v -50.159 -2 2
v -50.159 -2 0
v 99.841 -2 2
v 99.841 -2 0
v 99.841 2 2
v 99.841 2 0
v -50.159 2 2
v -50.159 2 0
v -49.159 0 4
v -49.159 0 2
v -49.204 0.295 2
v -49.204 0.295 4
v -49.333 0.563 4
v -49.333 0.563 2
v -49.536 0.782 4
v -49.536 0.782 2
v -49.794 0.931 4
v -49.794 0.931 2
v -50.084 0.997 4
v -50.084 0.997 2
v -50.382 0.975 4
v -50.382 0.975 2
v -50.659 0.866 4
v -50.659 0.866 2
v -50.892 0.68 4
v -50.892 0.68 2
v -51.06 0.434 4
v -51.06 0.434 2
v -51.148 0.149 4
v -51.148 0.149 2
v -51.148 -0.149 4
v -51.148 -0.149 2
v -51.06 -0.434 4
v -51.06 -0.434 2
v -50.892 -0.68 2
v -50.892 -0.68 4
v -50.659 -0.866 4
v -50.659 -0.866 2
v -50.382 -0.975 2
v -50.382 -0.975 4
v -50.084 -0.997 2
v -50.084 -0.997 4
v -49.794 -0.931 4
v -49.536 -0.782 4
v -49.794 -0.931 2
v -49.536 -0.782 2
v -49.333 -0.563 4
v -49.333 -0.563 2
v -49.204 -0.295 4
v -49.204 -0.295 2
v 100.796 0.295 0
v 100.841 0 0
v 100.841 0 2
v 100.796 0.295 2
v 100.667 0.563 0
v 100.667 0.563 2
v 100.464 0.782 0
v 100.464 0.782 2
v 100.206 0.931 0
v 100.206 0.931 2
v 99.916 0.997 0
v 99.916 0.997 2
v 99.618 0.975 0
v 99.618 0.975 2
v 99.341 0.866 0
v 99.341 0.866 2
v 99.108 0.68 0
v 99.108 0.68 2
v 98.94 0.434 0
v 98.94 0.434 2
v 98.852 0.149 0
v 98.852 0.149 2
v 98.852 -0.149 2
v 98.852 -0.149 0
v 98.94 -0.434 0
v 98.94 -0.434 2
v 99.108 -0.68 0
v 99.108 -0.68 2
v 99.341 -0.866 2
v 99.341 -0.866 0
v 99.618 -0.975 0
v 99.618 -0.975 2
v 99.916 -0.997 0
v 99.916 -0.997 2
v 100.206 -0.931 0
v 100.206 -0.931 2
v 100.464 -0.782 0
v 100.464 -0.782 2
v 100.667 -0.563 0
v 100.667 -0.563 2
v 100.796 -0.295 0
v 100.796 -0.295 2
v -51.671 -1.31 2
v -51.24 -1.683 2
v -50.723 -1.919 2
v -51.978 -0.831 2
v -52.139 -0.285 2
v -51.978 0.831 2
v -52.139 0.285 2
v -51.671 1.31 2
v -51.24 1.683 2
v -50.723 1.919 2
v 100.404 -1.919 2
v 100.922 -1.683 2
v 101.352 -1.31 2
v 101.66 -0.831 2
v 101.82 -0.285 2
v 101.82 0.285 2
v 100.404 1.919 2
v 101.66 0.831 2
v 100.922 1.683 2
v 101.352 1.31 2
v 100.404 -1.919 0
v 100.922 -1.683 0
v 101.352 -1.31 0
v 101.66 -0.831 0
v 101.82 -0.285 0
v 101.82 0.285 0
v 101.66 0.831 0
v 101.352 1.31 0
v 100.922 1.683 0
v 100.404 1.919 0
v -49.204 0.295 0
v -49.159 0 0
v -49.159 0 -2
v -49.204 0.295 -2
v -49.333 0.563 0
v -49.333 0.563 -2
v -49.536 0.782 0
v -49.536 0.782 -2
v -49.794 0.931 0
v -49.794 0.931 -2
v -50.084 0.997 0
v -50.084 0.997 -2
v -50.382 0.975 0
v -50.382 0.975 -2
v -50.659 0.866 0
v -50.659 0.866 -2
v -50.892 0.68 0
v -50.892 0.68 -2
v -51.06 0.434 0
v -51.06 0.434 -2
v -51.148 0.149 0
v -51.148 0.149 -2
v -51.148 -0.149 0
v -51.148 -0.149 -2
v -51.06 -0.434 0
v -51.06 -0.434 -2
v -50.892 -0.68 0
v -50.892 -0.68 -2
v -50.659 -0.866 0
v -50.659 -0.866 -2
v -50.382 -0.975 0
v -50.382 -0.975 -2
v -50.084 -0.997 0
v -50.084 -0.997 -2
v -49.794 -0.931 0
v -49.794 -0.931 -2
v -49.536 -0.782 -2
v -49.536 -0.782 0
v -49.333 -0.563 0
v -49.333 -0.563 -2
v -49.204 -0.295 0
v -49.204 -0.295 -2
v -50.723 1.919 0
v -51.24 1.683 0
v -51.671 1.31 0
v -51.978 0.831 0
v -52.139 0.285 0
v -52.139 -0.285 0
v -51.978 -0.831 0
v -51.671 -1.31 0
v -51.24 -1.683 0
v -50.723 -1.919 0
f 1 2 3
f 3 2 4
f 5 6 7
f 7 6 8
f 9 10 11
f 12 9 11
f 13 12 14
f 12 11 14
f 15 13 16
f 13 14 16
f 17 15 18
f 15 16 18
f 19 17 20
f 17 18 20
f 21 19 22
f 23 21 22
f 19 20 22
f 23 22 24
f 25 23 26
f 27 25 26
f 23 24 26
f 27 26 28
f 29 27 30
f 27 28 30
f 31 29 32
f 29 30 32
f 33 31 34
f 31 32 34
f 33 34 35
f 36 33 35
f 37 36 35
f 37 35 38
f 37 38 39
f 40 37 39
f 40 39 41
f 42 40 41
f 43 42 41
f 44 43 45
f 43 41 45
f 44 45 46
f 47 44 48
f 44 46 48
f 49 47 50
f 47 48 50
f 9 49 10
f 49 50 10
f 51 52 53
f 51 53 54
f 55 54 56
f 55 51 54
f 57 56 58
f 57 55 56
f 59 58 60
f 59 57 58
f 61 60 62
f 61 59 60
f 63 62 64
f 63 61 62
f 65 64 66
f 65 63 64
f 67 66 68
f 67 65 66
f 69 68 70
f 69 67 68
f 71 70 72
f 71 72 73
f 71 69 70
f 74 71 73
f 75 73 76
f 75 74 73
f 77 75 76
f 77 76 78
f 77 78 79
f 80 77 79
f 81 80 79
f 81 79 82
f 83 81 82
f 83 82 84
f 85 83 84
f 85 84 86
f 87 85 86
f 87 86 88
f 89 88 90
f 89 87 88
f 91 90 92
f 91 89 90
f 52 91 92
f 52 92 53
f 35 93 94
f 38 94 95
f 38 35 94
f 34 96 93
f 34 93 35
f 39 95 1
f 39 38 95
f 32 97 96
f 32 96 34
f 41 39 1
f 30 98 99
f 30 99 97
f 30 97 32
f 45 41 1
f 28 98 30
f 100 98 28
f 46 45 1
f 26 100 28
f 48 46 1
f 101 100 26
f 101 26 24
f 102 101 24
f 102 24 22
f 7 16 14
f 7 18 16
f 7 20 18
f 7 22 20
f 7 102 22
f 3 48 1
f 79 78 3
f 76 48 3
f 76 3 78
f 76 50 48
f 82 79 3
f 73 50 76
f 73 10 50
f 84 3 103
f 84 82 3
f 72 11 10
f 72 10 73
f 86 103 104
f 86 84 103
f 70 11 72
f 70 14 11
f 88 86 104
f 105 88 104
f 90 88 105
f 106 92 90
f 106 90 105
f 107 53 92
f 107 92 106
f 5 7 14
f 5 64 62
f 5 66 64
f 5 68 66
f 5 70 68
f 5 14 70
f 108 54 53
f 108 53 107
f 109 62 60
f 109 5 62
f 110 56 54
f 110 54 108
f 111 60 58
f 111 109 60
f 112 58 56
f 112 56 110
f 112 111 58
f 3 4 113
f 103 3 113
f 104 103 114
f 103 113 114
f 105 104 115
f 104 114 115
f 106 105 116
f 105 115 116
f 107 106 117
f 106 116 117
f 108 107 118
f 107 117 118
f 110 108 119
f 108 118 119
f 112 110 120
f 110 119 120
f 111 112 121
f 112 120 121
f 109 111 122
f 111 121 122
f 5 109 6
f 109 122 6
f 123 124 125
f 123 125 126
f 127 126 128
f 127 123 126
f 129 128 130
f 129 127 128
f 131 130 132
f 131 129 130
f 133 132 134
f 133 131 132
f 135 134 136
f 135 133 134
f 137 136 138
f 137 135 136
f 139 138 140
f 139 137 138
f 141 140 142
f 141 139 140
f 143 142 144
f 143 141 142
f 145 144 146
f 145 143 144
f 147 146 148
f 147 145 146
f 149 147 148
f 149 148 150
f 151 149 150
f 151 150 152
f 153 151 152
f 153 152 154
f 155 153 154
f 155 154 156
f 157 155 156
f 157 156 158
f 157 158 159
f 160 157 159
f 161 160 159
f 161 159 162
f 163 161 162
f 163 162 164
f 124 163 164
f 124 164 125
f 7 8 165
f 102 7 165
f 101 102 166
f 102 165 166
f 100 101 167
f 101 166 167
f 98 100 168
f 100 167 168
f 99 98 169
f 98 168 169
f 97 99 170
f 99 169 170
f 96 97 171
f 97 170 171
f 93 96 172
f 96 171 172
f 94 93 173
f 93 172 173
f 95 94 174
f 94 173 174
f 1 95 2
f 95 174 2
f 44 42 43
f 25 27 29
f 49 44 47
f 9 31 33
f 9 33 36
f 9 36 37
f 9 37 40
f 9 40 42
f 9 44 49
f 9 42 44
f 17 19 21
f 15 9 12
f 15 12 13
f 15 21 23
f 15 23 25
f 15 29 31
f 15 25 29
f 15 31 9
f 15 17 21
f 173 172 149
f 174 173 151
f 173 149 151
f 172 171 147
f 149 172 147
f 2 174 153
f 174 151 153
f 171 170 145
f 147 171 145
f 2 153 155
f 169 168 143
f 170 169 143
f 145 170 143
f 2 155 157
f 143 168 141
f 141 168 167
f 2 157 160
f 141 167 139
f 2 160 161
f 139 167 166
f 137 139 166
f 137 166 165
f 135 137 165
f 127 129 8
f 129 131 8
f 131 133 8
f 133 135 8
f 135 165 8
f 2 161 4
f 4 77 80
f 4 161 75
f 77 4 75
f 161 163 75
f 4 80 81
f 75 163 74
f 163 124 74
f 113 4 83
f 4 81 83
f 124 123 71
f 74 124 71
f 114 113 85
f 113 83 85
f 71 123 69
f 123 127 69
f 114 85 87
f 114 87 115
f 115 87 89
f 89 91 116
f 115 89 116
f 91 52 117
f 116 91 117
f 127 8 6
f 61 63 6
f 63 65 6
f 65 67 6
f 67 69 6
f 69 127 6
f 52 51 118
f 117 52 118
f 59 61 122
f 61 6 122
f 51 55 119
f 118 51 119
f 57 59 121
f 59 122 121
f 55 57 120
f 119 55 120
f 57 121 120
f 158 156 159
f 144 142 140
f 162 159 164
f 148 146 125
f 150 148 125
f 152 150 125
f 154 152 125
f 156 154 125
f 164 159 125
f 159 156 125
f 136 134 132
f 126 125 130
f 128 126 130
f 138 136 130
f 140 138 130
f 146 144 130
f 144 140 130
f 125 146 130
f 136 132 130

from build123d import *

# Parameters (mm, degrees)
SKETCH_1_R           = 1
EXTRUDE_1_DEPTH      = 2
SKETCH_2_R           = 1
EXTRUDE_2_DEPTH      = 2
EXTRUDE_2_DEPTH_BACK = 4


with BuildPart() as part:
    # 草图1 → 凸台-拉伸1 (new body)
    with BuildSketch(Plane.XY):
        with BuildLine():
            Line((-50.159162871, -2), (99.840837129, -2))
            ThreePointArc((99.840837129, -2), (101.840837129, 0), (99.840837129, 2))
            Line((99.840837129, 2), (-50.159162871, 2))
            ThreePointArc((-50.159162871, 2), (-52.159162871, 0), (-50.159162871, -2))
        make_face()
        with Locations((99.840837129, 0)):
            Circle(SKETCH_1_R, mode=Mode.SUBTRACT)
    extrude(amount=EXTRUDE_1_DEPTH)

    # 草图2 → 凸台-拉伸2 (add, two sides)
    with BuildSketch(Plane.XY.offset(2)) as extrude_2_sk:
        with Locations((-50.159162871, 0)):
            Circle(SKETCH_2_R)
    extrude(amount=EXTRUDE_2_DEPTH)
    extrude(extrude_2_sk.sketch, amount=-EXTRUDE_2_DEPTH_BACK)


solid = part.part
